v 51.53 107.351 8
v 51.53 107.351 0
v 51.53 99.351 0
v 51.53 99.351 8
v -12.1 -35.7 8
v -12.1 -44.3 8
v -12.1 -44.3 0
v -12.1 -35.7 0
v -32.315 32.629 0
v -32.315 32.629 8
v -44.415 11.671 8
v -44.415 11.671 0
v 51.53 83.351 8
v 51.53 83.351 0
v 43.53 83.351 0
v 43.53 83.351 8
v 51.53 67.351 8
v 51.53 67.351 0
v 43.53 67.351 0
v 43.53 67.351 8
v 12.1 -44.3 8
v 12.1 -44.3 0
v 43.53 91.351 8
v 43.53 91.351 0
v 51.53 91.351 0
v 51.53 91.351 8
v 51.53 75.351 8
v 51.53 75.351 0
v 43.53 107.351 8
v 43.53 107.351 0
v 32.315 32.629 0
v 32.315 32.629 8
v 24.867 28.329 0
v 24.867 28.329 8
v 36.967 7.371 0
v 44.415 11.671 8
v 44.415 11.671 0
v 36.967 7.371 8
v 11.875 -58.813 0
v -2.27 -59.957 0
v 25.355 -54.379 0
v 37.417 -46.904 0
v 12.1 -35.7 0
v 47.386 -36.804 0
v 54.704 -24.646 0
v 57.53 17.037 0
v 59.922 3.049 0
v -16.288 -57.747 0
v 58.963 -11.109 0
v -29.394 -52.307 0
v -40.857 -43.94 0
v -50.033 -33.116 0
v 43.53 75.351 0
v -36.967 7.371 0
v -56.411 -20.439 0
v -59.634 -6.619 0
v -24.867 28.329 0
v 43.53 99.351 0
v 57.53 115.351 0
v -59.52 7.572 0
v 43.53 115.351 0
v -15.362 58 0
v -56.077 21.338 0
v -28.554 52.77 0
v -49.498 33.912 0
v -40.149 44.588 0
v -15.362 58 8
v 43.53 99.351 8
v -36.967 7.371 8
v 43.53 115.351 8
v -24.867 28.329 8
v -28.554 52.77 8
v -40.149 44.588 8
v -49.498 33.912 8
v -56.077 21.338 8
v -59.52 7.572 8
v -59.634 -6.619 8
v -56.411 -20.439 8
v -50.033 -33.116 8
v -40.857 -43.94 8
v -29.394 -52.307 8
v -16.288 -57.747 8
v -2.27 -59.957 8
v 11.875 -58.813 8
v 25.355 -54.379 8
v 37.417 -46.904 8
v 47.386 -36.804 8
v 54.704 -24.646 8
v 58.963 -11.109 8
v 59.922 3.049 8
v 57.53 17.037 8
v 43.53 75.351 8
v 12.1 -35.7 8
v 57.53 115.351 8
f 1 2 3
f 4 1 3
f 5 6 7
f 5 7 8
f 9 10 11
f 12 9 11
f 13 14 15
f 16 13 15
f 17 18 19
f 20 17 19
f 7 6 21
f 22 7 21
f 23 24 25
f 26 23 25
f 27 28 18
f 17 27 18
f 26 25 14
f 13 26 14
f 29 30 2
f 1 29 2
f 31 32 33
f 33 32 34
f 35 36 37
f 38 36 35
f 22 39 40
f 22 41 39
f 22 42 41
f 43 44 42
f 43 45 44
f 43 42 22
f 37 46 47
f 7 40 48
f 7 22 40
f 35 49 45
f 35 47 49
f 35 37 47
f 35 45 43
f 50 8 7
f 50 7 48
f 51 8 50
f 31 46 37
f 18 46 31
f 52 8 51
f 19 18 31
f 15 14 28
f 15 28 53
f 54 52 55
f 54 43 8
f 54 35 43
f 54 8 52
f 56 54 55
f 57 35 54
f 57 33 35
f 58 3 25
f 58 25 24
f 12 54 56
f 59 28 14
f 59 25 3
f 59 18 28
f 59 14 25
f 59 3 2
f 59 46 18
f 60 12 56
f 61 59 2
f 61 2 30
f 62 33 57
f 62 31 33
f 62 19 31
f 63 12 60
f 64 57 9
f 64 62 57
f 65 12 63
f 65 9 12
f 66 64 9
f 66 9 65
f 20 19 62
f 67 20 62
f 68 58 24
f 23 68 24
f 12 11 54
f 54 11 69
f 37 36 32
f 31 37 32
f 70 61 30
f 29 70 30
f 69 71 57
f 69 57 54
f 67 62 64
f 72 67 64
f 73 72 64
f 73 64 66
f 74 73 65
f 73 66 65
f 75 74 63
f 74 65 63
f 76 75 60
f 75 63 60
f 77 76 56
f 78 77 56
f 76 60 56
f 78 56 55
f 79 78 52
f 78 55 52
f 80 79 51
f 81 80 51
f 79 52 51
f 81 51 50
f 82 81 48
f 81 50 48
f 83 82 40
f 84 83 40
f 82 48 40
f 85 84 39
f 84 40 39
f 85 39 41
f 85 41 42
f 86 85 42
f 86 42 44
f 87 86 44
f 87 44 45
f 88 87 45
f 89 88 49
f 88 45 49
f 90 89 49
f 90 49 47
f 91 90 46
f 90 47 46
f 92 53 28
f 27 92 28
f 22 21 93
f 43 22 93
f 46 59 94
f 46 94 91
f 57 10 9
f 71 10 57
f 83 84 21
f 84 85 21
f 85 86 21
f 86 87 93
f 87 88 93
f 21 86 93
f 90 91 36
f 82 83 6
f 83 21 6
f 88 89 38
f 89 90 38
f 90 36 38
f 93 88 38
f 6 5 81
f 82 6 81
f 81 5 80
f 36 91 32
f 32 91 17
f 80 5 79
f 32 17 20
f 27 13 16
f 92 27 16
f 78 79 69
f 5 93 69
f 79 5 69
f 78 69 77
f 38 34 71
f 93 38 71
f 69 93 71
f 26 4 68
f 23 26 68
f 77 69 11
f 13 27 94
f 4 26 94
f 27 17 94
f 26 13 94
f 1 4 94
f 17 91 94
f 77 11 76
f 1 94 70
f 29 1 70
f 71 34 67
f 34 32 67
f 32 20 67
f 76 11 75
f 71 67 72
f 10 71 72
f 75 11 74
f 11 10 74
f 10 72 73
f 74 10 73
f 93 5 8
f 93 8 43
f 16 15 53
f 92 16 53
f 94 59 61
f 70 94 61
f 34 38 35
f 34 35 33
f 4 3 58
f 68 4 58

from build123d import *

# Parameters (mm, degrees)
PAD_DEPTH          = 8
SKETCH001_W        = 24.2
SKETCH001_H        = 8.6
POCKET_DEPTH       = 433.263242
POLARPATTERN_COUNT = 3


with BuildPart() as part:
    # Sketch → Pad (new body)
    with BuildSketch(Plane.XY):
        with BuildLine():
            Line((51.5303, 115.351058), (57.5303, 115.351058))
            Line((57.5303, 115.351058), (57.5303, 17.037153))
            ThreePointArc((-15.362291, 58), (-29.394284, -52.306558), (57.5303, 17.037153))
            Line((43.5303, 67.351058), (-15.362291, 58))
            Line((51.5303, 67.351058), (43.5303, 67.351058))
            Line((51.5303, 75.351058), (51.5303, 67.351058))
            Line((43.5303, 75.351058), (51.5303, 75.351058))
            Line((43.5303, 83.351058), (43.5303, 75.351058))
            Line((51.5303, 83.351058), (43.5303, 83.351058))
            Line((51.5303, 91.351058), (51.5303, 83.351058))
            Line((43.5303, 91.351058), (51.5303, 91.351058))
            Line((43.5303, 99.351058), (43.5303, 91.351058))
            Line((51.5303, 99.351058), (43.5303, 99.351058))
            Line((51.5303, 107.351058), (51.5303, 99.351058))
            Line((43.5303, 107.351058), (51.5303, 107.351058))
            Line((43.5303, 115.351058), (43.5303, 107.351058))
            Line((51.5303, 115.351058), (43.5303, 115.351058))
        make_face()
    extrude(amount=PAD_DEPTH)

    # Sketch001 → Pocket (cut, through all)
    with BuildSketch(Plane.XY.offset(8)):
        with Locations((0, -40)):
            Rectangle(SKETCH001_W, SKETCH001_H)
    pocket = extrude(amount=-POCKET_DEPTH, mode=Mode.SUBTRACT)

    # PolarPattern: Pocket ×3 about axis
    polarpattern_axis = Axis((0, 0, 8), (0, 0, 1))
    for i in range(1, POLARPATTERN_COUNT):
        add(pocket.rotate(polarpattern_axis, i * 360 / POLARPATTERN_COUNT), mode=Mode.SUBTRACT)


solid = part.part
